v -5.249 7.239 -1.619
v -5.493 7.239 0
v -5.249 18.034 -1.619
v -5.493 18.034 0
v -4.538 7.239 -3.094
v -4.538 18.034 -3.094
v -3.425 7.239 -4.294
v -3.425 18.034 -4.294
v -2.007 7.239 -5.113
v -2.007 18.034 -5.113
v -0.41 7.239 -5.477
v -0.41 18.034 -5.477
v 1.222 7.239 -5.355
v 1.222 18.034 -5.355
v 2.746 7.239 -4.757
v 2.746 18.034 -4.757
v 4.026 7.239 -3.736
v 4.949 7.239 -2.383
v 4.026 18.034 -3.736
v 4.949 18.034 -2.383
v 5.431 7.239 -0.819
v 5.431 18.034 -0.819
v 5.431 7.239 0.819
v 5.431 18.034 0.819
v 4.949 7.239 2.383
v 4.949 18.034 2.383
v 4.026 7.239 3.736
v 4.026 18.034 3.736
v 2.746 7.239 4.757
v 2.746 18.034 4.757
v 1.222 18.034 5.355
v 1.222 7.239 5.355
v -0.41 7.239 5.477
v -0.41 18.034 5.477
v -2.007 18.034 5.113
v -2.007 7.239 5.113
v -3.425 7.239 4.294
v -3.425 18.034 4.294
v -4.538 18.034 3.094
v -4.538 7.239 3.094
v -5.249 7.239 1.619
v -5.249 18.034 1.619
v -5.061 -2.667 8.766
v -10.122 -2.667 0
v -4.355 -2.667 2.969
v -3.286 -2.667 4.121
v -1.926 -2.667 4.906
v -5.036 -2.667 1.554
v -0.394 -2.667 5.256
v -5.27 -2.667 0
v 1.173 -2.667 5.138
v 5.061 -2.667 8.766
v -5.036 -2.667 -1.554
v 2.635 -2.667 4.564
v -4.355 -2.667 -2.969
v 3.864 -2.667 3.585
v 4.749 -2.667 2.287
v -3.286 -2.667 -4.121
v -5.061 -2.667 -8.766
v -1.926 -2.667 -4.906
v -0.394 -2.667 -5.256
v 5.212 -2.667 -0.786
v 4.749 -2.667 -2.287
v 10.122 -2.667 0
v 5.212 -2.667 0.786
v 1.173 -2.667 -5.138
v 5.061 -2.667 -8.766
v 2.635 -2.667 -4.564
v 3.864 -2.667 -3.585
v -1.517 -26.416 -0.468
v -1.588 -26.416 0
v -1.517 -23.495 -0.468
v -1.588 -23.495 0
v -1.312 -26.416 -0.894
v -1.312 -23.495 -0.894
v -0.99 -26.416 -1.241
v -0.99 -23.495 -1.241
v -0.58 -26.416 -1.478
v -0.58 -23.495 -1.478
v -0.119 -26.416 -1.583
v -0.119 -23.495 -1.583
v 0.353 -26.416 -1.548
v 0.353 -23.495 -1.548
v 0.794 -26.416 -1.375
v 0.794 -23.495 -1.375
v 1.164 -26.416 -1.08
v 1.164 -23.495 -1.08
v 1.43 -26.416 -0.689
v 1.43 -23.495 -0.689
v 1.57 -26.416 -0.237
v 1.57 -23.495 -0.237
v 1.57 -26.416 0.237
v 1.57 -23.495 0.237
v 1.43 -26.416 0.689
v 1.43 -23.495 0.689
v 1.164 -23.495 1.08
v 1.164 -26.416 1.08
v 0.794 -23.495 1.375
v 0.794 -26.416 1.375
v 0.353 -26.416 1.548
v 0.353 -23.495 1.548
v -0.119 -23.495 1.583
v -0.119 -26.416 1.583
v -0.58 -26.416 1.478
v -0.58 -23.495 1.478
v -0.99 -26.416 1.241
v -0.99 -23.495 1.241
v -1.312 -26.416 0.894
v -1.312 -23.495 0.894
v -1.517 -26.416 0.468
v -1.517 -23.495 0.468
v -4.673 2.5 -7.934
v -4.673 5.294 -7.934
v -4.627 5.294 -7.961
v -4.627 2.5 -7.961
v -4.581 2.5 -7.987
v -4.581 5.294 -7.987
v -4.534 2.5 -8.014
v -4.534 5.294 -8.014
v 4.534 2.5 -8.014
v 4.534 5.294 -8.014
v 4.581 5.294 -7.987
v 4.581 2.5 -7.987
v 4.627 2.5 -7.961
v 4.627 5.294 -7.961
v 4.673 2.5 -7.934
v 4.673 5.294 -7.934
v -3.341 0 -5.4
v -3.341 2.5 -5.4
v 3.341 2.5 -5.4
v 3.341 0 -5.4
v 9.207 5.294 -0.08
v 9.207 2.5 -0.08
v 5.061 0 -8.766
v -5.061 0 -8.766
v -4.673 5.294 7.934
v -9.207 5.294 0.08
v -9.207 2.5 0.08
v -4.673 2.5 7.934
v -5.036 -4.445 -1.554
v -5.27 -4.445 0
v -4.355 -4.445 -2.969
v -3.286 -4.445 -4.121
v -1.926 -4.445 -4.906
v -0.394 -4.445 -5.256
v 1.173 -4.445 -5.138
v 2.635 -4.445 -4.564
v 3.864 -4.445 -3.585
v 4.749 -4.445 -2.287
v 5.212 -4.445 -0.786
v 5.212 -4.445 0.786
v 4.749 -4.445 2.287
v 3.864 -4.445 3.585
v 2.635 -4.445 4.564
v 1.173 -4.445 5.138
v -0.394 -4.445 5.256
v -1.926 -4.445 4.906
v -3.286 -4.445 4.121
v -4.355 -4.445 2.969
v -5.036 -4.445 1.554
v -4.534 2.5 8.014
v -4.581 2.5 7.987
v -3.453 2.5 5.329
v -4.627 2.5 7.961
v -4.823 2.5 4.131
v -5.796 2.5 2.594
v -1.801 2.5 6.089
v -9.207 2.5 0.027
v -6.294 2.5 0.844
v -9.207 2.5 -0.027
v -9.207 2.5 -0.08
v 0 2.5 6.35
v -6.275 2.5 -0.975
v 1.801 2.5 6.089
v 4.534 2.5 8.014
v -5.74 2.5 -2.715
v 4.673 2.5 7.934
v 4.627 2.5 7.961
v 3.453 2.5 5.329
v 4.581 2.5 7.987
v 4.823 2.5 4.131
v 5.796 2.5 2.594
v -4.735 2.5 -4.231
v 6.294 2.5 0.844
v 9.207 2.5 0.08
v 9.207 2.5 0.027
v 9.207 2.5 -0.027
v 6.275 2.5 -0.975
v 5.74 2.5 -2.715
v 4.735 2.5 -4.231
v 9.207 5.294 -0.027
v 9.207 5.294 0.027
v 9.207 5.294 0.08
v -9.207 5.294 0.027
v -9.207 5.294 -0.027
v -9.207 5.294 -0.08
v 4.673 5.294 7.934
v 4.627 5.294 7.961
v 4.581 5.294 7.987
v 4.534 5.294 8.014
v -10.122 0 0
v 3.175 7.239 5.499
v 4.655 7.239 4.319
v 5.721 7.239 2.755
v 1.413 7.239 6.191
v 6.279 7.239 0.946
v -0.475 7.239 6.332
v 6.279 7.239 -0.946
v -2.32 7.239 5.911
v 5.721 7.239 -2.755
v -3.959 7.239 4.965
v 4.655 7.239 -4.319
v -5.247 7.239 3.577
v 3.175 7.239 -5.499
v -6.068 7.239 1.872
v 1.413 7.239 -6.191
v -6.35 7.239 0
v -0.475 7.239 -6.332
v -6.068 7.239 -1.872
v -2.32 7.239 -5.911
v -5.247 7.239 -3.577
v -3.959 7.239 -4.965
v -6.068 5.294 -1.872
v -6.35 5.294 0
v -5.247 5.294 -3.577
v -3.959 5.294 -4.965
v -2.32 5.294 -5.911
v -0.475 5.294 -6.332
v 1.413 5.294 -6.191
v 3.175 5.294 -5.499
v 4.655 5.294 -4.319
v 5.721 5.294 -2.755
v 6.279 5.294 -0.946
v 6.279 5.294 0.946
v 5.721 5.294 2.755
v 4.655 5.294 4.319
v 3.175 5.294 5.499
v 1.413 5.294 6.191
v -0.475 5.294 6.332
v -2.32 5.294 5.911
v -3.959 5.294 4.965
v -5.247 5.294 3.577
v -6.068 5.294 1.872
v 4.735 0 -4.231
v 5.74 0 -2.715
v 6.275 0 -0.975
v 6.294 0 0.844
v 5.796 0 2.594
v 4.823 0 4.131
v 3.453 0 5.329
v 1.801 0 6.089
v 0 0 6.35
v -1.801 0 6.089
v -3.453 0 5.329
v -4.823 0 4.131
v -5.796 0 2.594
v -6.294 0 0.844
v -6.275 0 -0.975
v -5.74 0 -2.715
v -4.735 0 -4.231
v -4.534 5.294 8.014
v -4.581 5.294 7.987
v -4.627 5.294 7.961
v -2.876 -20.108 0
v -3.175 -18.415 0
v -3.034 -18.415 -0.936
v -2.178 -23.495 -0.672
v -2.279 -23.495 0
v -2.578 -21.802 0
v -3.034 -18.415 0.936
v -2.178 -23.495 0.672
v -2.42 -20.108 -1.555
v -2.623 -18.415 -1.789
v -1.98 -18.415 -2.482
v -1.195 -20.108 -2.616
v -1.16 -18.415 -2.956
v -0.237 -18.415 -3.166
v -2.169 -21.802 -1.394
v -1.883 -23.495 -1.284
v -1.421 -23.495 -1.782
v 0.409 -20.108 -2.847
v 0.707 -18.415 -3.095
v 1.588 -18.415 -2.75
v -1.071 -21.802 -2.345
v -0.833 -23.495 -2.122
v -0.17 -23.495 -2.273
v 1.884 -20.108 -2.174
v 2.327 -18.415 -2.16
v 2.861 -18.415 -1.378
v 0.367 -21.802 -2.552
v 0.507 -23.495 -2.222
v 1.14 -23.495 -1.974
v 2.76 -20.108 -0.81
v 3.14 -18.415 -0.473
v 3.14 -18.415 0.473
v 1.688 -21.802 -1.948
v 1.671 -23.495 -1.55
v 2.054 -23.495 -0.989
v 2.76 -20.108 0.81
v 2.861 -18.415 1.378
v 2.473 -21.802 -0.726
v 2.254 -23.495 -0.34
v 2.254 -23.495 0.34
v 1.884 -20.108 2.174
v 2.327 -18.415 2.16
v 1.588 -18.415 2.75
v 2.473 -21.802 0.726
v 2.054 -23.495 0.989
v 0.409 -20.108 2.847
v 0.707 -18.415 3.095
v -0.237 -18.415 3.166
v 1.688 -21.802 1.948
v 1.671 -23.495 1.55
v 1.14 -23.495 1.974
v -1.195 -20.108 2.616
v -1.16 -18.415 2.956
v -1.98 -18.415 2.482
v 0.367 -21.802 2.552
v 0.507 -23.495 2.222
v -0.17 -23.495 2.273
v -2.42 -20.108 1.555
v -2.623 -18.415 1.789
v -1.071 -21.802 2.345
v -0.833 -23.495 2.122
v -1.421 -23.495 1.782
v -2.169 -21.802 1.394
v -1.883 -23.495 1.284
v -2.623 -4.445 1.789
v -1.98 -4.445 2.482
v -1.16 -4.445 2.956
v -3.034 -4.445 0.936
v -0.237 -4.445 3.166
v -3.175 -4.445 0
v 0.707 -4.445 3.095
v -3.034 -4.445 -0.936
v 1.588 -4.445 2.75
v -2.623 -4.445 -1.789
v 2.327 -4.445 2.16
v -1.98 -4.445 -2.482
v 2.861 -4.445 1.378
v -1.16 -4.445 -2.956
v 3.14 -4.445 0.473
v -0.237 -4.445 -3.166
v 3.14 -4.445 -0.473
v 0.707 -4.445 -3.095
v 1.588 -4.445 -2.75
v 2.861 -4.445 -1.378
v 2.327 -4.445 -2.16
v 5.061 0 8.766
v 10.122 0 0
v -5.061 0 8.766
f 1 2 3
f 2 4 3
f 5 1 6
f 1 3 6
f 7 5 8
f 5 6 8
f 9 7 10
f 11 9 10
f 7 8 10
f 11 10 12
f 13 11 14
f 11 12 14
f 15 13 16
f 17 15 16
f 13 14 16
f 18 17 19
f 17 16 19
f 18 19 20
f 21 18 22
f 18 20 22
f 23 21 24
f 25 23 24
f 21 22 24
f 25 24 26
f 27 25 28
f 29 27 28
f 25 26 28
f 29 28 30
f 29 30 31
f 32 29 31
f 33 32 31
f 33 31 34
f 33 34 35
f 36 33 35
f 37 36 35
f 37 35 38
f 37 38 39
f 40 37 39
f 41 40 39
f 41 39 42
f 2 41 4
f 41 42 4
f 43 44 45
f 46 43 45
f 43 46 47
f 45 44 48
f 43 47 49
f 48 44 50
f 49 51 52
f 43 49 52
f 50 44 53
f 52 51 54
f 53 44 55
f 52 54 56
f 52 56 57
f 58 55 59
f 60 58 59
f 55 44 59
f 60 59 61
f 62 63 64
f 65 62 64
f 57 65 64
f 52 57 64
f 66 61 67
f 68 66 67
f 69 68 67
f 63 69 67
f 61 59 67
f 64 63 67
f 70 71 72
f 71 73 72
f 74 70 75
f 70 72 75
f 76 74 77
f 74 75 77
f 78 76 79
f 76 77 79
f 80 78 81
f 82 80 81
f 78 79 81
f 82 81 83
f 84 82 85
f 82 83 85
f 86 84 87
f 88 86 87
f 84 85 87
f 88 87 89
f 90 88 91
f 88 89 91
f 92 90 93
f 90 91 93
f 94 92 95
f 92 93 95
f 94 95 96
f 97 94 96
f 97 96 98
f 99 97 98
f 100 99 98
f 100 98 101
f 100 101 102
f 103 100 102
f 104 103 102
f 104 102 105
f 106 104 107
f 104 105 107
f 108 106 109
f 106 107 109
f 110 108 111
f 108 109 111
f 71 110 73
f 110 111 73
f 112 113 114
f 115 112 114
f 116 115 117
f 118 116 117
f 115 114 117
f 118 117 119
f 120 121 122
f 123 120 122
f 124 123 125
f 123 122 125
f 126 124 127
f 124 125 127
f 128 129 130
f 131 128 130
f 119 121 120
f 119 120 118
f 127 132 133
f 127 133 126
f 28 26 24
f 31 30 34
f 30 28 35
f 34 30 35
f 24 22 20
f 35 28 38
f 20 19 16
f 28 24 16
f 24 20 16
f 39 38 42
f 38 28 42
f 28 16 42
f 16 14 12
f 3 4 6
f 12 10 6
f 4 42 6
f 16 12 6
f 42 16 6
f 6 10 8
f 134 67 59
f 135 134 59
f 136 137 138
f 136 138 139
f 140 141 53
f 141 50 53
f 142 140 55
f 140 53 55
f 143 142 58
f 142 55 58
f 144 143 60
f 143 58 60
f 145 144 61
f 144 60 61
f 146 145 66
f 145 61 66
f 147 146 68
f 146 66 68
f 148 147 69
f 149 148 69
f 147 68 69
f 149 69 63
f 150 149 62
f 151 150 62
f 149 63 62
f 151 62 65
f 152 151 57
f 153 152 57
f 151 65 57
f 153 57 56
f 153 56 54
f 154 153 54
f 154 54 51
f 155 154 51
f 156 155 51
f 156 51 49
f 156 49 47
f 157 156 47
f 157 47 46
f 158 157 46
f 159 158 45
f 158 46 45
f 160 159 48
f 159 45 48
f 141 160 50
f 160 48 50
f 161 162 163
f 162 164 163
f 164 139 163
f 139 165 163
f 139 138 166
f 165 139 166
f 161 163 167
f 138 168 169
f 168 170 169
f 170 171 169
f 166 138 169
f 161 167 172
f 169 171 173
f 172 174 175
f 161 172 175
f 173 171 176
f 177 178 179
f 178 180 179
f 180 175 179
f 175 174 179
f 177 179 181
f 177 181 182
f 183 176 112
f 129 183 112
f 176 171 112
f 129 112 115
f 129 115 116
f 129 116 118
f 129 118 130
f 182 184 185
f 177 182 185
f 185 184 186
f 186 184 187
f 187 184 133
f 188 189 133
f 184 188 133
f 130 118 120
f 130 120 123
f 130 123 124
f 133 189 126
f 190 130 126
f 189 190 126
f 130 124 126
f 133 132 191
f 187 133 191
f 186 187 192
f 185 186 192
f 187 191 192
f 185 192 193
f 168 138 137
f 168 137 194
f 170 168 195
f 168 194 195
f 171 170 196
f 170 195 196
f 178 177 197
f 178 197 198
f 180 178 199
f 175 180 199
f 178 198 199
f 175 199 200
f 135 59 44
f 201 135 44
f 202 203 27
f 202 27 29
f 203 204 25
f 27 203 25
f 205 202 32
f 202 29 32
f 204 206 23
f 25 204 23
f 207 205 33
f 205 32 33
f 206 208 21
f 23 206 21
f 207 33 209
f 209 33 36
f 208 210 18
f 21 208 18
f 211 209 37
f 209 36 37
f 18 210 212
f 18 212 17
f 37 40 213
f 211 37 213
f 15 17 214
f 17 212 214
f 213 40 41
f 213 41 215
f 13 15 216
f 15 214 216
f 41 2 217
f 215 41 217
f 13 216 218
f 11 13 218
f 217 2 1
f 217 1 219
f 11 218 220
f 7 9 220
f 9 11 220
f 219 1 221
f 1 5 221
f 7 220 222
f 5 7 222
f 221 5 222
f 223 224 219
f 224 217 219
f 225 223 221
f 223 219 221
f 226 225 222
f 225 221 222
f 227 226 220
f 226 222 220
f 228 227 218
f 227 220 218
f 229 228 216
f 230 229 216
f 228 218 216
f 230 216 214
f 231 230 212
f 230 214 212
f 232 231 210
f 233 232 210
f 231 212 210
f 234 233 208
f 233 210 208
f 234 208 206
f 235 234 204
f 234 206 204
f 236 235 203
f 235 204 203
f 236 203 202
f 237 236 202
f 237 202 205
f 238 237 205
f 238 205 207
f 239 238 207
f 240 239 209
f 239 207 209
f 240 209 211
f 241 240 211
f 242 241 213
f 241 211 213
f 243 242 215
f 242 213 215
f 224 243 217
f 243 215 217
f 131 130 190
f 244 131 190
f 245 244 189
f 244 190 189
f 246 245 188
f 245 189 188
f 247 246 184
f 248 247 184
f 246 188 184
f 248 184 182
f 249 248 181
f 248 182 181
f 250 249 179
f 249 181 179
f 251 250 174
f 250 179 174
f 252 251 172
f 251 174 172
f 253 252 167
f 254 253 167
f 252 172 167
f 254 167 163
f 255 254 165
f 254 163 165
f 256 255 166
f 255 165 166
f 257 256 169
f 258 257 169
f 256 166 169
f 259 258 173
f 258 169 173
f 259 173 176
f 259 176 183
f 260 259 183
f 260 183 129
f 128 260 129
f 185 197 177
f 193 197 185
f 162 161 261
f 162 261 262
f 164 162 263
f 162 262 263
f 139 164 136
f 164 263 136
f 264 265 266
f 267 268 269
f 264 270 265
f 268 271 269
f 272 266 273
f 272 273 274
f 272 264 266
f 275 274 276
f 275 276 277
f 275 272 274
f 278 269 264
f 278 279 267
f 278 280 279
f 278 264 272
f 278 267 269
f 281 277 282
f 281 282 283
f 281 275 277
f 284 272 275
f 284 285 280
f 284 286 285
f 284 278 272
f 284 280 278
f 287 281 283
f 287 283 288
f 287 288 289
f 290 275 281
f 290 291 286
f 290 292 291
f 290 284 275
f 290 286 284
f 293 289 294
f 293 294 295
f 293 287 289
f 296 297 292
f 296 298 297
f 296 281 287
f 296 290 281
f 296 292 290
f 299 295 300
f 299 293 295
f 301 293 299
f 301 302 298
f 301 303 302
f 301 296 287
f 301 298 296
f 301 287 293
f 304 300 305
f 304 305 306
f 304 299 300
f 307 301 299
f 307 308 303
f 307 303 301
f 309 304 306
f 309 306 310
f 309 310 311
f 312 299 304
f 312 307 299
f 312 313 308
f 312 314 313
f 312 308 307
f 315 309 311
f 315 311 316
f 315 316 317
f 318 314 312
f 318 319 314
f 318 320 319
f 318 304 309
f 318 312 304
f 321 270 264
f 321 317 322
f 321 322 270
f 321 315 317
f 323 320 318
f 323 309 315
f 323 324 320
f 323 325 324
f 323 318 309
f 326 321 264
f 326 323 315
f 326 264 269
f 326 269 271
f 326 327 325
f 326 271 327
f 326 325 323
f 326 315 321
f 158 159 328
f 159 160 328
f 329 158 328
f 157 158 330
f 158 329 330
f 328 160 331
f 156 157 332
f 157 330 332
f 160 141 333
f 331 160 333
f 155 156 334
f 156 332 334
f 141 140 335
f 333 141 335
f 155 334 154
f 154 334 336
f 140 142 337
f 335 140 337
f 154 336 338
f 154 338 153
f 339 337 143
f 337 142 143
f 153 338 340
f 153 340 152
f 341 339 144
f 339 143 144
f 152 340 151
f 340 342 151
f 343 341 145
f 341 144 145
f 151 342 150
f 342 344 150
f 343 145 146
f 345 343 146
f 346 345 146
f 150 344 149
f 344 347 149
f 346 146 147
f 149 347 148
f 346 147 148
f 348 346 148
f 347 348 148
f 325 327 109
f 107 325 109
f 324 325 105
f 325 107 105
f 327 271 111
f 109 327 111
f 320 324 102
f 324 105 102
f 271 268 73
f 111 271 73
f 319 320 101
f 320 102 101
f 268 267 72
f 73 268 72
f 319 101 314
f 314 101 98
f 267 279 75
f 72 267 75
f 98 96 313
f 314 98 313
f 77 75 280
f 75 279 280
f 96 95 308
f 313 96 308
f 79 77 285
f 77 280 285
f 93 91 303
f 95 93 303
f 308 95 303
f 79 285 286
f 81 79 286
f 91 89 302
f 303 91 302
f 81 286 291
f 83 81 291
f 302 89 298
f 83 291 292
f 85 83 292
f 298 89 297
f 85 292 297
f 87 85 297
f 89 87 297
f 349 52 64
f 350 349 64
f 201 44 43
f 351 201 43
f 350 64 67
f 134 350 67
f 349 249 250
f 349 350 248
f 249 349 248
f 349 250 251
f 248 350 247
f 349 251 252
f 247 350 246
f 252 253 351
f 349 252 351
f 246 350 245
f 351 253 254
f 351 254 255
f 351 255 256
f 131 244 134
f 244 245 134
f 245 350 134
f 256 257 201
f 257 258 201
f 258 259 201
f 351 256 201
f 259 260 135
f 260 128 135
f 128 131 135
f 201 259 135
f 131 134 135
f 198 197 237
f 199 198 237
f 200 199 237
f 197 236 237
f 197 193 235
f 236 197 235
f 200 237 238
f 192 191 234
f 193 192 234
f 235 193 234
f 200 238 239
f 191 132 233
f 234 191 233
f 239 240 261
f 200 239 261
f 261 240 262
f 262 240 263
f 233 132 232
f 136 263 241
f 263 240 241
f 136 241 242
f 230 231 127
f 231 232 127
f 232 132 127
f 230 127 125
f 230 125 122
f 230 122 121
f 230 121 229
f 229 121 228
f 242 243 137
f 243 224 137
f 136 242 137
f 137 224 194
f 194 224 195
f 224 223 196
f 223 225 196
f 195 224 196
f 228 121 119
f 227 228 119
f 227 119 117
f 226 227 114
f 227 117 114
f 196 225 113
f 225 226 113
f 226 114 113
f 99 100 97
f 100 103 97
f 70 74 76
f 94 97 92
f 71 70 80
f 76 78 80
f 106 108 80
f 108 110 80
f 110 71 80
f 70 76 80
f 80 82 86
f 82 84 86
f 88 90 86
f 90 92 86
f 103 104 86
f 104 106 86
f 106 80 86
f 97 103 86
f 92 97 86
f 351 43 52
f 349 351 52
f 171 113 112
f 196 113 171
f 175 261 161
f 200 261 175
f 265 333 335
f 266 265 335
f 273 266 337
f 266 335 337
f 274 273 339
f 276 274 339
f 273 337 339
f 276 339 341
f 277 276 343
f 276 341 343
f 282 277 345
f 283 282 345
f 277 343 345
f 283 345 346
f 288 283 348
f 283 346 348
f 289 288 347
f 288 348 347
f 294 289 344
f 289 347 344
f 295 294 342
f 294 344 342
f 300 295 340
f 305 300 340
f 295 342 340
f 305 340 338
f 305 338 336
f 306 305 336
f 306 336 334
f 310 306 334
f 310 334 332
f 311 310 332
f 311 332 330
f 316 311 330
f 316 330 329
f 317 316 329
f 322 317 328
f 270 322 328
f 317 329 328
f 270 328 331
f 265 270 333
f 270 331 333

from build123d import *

# Parameters (mm, degrees)
SKETCH2_OUTSIDE_W  = 32.818
SKETCH2_OUTSIDE_H  = 32.818
CUT_EXTRUDE1_DEPTH = 2.667
CHAMFER1_SIZE      = 5.08
CHAMFER1_SIZE2     = 0.895741062
SKETCH3_OUTSIDE_W  = 32.684
SKETCH3_OUTSIDE_H  = 30.854
CUT_EXTRUDE2_DEPTH = 2.794
CUT_EXTRUDE3_START = 2.5
CUT_EXTRUDE3_DEPTH = 2.5


with BuildPart() as part:
    # Sketch1 → Revolve1 (revolve)
    with BuildSketch(Plane.XY, mode=Mode.PRIVATE) as revolve1_sk:
        Polygon((1.5875, -26.416), (1.5875, -23.495), (3.175, -23.495), (3.175, -4.445), (5.2705, -4.445), (5.2705, -2.667), (10.1219, -2.667), (10.1219, 0), (6.35, 0), (6.35, 2.5), (9.2075, 2.5), (9.2075, 5.294), (6.35, 5.294), (6.35, 7.239), (5.49275, 7.239), (5.49275, 18.034), (0, 18.034), (0, -26.416), align=None)
    revolve(revolve1_sk.sketch.rotate(Axis((0, 42.258635304, 0), (0, -1, 0)), 180), axis=Axis((0, 42.258635304, 0), (0, -1, 0)))

    # Sketch2 outside → Cut-Extrude1 (cut)
    with BuildSketch(Plane.XZ.offset(2.667)):
        Rectangle(SKETCH2_OUTSIDE_W, SKETCH2_OUTSIDE_H)
        Polygon((-5.06095, 8.765822535), (5.06095, 8.765822535), (10.1219, 0), (5.06095, -8.765822535), (-5.06095, -8.765822535), (-10.1219, 0), align=None, mode=Mode.SUBTRACT)
    extrude(amount=-CUT_EXTRUDE1_DEPTH, mode=Mode.SUBTRACT)

    # Chamfer1
    chamfer1_edges = [part.edges().sort_by_distance(p)[0] for p in [
        (3.175, -23.495, 0),
    ]]
    chamfer1_side = [part.faces().sort_by_distance(p)[0] for p in [
        (3.175, -13.97, 0),
    ]]
    chamfer(chamfer1_edges, length=CHAMFER1_SIZE, length2=CHAMFER1_SIZE2, reference=chamfer1_side[0])

    # Sketch3 outside → Cut-Extrude2 (cut)
    with BuildSketch(Plane(origin=(0, 5.294, 0), x_dir=(1, 0, 0), z_dir=(0, 1, 0))):
        Rectangle(SKETCH3_OUTSIDE_W, SKETCH3_OUTSIDE_H)
        Polygon((4.626711852, -8.0137), (9.253423704, 0), (4.626711852, 8.0137), (-4.626711852, 8.0137), (-9.253423704, 0), (-4.626711852, -8.0137), align=None, mode=Mode.SUBTRACT)
    extrude(amount=-CUT_EXTRUDE2_DEPTH, mode=Mode.SUBTRACT)

    # Sketch4 → Cut-Extrude3 (cut)
    with BuildSketch(Plane(origin=(0, 0, 0), x_dir=(1, 0, 0), z_dir=(0, 1, 0)).offset(CUT_EXTRUDE3_START)):
        with BuildLine():
            Line((-3.341032774, 5.4), (3.341032774, 5.4))
            ThreePointArc((3.341032774, 5.4), (0, 6.35), (-3.341032774, 5.4))
        make_face()
    extrude(amount=-CUT_EXTRUDE3_DEPTH, mode=Mode.SUBTRACT)


solid = part.part
